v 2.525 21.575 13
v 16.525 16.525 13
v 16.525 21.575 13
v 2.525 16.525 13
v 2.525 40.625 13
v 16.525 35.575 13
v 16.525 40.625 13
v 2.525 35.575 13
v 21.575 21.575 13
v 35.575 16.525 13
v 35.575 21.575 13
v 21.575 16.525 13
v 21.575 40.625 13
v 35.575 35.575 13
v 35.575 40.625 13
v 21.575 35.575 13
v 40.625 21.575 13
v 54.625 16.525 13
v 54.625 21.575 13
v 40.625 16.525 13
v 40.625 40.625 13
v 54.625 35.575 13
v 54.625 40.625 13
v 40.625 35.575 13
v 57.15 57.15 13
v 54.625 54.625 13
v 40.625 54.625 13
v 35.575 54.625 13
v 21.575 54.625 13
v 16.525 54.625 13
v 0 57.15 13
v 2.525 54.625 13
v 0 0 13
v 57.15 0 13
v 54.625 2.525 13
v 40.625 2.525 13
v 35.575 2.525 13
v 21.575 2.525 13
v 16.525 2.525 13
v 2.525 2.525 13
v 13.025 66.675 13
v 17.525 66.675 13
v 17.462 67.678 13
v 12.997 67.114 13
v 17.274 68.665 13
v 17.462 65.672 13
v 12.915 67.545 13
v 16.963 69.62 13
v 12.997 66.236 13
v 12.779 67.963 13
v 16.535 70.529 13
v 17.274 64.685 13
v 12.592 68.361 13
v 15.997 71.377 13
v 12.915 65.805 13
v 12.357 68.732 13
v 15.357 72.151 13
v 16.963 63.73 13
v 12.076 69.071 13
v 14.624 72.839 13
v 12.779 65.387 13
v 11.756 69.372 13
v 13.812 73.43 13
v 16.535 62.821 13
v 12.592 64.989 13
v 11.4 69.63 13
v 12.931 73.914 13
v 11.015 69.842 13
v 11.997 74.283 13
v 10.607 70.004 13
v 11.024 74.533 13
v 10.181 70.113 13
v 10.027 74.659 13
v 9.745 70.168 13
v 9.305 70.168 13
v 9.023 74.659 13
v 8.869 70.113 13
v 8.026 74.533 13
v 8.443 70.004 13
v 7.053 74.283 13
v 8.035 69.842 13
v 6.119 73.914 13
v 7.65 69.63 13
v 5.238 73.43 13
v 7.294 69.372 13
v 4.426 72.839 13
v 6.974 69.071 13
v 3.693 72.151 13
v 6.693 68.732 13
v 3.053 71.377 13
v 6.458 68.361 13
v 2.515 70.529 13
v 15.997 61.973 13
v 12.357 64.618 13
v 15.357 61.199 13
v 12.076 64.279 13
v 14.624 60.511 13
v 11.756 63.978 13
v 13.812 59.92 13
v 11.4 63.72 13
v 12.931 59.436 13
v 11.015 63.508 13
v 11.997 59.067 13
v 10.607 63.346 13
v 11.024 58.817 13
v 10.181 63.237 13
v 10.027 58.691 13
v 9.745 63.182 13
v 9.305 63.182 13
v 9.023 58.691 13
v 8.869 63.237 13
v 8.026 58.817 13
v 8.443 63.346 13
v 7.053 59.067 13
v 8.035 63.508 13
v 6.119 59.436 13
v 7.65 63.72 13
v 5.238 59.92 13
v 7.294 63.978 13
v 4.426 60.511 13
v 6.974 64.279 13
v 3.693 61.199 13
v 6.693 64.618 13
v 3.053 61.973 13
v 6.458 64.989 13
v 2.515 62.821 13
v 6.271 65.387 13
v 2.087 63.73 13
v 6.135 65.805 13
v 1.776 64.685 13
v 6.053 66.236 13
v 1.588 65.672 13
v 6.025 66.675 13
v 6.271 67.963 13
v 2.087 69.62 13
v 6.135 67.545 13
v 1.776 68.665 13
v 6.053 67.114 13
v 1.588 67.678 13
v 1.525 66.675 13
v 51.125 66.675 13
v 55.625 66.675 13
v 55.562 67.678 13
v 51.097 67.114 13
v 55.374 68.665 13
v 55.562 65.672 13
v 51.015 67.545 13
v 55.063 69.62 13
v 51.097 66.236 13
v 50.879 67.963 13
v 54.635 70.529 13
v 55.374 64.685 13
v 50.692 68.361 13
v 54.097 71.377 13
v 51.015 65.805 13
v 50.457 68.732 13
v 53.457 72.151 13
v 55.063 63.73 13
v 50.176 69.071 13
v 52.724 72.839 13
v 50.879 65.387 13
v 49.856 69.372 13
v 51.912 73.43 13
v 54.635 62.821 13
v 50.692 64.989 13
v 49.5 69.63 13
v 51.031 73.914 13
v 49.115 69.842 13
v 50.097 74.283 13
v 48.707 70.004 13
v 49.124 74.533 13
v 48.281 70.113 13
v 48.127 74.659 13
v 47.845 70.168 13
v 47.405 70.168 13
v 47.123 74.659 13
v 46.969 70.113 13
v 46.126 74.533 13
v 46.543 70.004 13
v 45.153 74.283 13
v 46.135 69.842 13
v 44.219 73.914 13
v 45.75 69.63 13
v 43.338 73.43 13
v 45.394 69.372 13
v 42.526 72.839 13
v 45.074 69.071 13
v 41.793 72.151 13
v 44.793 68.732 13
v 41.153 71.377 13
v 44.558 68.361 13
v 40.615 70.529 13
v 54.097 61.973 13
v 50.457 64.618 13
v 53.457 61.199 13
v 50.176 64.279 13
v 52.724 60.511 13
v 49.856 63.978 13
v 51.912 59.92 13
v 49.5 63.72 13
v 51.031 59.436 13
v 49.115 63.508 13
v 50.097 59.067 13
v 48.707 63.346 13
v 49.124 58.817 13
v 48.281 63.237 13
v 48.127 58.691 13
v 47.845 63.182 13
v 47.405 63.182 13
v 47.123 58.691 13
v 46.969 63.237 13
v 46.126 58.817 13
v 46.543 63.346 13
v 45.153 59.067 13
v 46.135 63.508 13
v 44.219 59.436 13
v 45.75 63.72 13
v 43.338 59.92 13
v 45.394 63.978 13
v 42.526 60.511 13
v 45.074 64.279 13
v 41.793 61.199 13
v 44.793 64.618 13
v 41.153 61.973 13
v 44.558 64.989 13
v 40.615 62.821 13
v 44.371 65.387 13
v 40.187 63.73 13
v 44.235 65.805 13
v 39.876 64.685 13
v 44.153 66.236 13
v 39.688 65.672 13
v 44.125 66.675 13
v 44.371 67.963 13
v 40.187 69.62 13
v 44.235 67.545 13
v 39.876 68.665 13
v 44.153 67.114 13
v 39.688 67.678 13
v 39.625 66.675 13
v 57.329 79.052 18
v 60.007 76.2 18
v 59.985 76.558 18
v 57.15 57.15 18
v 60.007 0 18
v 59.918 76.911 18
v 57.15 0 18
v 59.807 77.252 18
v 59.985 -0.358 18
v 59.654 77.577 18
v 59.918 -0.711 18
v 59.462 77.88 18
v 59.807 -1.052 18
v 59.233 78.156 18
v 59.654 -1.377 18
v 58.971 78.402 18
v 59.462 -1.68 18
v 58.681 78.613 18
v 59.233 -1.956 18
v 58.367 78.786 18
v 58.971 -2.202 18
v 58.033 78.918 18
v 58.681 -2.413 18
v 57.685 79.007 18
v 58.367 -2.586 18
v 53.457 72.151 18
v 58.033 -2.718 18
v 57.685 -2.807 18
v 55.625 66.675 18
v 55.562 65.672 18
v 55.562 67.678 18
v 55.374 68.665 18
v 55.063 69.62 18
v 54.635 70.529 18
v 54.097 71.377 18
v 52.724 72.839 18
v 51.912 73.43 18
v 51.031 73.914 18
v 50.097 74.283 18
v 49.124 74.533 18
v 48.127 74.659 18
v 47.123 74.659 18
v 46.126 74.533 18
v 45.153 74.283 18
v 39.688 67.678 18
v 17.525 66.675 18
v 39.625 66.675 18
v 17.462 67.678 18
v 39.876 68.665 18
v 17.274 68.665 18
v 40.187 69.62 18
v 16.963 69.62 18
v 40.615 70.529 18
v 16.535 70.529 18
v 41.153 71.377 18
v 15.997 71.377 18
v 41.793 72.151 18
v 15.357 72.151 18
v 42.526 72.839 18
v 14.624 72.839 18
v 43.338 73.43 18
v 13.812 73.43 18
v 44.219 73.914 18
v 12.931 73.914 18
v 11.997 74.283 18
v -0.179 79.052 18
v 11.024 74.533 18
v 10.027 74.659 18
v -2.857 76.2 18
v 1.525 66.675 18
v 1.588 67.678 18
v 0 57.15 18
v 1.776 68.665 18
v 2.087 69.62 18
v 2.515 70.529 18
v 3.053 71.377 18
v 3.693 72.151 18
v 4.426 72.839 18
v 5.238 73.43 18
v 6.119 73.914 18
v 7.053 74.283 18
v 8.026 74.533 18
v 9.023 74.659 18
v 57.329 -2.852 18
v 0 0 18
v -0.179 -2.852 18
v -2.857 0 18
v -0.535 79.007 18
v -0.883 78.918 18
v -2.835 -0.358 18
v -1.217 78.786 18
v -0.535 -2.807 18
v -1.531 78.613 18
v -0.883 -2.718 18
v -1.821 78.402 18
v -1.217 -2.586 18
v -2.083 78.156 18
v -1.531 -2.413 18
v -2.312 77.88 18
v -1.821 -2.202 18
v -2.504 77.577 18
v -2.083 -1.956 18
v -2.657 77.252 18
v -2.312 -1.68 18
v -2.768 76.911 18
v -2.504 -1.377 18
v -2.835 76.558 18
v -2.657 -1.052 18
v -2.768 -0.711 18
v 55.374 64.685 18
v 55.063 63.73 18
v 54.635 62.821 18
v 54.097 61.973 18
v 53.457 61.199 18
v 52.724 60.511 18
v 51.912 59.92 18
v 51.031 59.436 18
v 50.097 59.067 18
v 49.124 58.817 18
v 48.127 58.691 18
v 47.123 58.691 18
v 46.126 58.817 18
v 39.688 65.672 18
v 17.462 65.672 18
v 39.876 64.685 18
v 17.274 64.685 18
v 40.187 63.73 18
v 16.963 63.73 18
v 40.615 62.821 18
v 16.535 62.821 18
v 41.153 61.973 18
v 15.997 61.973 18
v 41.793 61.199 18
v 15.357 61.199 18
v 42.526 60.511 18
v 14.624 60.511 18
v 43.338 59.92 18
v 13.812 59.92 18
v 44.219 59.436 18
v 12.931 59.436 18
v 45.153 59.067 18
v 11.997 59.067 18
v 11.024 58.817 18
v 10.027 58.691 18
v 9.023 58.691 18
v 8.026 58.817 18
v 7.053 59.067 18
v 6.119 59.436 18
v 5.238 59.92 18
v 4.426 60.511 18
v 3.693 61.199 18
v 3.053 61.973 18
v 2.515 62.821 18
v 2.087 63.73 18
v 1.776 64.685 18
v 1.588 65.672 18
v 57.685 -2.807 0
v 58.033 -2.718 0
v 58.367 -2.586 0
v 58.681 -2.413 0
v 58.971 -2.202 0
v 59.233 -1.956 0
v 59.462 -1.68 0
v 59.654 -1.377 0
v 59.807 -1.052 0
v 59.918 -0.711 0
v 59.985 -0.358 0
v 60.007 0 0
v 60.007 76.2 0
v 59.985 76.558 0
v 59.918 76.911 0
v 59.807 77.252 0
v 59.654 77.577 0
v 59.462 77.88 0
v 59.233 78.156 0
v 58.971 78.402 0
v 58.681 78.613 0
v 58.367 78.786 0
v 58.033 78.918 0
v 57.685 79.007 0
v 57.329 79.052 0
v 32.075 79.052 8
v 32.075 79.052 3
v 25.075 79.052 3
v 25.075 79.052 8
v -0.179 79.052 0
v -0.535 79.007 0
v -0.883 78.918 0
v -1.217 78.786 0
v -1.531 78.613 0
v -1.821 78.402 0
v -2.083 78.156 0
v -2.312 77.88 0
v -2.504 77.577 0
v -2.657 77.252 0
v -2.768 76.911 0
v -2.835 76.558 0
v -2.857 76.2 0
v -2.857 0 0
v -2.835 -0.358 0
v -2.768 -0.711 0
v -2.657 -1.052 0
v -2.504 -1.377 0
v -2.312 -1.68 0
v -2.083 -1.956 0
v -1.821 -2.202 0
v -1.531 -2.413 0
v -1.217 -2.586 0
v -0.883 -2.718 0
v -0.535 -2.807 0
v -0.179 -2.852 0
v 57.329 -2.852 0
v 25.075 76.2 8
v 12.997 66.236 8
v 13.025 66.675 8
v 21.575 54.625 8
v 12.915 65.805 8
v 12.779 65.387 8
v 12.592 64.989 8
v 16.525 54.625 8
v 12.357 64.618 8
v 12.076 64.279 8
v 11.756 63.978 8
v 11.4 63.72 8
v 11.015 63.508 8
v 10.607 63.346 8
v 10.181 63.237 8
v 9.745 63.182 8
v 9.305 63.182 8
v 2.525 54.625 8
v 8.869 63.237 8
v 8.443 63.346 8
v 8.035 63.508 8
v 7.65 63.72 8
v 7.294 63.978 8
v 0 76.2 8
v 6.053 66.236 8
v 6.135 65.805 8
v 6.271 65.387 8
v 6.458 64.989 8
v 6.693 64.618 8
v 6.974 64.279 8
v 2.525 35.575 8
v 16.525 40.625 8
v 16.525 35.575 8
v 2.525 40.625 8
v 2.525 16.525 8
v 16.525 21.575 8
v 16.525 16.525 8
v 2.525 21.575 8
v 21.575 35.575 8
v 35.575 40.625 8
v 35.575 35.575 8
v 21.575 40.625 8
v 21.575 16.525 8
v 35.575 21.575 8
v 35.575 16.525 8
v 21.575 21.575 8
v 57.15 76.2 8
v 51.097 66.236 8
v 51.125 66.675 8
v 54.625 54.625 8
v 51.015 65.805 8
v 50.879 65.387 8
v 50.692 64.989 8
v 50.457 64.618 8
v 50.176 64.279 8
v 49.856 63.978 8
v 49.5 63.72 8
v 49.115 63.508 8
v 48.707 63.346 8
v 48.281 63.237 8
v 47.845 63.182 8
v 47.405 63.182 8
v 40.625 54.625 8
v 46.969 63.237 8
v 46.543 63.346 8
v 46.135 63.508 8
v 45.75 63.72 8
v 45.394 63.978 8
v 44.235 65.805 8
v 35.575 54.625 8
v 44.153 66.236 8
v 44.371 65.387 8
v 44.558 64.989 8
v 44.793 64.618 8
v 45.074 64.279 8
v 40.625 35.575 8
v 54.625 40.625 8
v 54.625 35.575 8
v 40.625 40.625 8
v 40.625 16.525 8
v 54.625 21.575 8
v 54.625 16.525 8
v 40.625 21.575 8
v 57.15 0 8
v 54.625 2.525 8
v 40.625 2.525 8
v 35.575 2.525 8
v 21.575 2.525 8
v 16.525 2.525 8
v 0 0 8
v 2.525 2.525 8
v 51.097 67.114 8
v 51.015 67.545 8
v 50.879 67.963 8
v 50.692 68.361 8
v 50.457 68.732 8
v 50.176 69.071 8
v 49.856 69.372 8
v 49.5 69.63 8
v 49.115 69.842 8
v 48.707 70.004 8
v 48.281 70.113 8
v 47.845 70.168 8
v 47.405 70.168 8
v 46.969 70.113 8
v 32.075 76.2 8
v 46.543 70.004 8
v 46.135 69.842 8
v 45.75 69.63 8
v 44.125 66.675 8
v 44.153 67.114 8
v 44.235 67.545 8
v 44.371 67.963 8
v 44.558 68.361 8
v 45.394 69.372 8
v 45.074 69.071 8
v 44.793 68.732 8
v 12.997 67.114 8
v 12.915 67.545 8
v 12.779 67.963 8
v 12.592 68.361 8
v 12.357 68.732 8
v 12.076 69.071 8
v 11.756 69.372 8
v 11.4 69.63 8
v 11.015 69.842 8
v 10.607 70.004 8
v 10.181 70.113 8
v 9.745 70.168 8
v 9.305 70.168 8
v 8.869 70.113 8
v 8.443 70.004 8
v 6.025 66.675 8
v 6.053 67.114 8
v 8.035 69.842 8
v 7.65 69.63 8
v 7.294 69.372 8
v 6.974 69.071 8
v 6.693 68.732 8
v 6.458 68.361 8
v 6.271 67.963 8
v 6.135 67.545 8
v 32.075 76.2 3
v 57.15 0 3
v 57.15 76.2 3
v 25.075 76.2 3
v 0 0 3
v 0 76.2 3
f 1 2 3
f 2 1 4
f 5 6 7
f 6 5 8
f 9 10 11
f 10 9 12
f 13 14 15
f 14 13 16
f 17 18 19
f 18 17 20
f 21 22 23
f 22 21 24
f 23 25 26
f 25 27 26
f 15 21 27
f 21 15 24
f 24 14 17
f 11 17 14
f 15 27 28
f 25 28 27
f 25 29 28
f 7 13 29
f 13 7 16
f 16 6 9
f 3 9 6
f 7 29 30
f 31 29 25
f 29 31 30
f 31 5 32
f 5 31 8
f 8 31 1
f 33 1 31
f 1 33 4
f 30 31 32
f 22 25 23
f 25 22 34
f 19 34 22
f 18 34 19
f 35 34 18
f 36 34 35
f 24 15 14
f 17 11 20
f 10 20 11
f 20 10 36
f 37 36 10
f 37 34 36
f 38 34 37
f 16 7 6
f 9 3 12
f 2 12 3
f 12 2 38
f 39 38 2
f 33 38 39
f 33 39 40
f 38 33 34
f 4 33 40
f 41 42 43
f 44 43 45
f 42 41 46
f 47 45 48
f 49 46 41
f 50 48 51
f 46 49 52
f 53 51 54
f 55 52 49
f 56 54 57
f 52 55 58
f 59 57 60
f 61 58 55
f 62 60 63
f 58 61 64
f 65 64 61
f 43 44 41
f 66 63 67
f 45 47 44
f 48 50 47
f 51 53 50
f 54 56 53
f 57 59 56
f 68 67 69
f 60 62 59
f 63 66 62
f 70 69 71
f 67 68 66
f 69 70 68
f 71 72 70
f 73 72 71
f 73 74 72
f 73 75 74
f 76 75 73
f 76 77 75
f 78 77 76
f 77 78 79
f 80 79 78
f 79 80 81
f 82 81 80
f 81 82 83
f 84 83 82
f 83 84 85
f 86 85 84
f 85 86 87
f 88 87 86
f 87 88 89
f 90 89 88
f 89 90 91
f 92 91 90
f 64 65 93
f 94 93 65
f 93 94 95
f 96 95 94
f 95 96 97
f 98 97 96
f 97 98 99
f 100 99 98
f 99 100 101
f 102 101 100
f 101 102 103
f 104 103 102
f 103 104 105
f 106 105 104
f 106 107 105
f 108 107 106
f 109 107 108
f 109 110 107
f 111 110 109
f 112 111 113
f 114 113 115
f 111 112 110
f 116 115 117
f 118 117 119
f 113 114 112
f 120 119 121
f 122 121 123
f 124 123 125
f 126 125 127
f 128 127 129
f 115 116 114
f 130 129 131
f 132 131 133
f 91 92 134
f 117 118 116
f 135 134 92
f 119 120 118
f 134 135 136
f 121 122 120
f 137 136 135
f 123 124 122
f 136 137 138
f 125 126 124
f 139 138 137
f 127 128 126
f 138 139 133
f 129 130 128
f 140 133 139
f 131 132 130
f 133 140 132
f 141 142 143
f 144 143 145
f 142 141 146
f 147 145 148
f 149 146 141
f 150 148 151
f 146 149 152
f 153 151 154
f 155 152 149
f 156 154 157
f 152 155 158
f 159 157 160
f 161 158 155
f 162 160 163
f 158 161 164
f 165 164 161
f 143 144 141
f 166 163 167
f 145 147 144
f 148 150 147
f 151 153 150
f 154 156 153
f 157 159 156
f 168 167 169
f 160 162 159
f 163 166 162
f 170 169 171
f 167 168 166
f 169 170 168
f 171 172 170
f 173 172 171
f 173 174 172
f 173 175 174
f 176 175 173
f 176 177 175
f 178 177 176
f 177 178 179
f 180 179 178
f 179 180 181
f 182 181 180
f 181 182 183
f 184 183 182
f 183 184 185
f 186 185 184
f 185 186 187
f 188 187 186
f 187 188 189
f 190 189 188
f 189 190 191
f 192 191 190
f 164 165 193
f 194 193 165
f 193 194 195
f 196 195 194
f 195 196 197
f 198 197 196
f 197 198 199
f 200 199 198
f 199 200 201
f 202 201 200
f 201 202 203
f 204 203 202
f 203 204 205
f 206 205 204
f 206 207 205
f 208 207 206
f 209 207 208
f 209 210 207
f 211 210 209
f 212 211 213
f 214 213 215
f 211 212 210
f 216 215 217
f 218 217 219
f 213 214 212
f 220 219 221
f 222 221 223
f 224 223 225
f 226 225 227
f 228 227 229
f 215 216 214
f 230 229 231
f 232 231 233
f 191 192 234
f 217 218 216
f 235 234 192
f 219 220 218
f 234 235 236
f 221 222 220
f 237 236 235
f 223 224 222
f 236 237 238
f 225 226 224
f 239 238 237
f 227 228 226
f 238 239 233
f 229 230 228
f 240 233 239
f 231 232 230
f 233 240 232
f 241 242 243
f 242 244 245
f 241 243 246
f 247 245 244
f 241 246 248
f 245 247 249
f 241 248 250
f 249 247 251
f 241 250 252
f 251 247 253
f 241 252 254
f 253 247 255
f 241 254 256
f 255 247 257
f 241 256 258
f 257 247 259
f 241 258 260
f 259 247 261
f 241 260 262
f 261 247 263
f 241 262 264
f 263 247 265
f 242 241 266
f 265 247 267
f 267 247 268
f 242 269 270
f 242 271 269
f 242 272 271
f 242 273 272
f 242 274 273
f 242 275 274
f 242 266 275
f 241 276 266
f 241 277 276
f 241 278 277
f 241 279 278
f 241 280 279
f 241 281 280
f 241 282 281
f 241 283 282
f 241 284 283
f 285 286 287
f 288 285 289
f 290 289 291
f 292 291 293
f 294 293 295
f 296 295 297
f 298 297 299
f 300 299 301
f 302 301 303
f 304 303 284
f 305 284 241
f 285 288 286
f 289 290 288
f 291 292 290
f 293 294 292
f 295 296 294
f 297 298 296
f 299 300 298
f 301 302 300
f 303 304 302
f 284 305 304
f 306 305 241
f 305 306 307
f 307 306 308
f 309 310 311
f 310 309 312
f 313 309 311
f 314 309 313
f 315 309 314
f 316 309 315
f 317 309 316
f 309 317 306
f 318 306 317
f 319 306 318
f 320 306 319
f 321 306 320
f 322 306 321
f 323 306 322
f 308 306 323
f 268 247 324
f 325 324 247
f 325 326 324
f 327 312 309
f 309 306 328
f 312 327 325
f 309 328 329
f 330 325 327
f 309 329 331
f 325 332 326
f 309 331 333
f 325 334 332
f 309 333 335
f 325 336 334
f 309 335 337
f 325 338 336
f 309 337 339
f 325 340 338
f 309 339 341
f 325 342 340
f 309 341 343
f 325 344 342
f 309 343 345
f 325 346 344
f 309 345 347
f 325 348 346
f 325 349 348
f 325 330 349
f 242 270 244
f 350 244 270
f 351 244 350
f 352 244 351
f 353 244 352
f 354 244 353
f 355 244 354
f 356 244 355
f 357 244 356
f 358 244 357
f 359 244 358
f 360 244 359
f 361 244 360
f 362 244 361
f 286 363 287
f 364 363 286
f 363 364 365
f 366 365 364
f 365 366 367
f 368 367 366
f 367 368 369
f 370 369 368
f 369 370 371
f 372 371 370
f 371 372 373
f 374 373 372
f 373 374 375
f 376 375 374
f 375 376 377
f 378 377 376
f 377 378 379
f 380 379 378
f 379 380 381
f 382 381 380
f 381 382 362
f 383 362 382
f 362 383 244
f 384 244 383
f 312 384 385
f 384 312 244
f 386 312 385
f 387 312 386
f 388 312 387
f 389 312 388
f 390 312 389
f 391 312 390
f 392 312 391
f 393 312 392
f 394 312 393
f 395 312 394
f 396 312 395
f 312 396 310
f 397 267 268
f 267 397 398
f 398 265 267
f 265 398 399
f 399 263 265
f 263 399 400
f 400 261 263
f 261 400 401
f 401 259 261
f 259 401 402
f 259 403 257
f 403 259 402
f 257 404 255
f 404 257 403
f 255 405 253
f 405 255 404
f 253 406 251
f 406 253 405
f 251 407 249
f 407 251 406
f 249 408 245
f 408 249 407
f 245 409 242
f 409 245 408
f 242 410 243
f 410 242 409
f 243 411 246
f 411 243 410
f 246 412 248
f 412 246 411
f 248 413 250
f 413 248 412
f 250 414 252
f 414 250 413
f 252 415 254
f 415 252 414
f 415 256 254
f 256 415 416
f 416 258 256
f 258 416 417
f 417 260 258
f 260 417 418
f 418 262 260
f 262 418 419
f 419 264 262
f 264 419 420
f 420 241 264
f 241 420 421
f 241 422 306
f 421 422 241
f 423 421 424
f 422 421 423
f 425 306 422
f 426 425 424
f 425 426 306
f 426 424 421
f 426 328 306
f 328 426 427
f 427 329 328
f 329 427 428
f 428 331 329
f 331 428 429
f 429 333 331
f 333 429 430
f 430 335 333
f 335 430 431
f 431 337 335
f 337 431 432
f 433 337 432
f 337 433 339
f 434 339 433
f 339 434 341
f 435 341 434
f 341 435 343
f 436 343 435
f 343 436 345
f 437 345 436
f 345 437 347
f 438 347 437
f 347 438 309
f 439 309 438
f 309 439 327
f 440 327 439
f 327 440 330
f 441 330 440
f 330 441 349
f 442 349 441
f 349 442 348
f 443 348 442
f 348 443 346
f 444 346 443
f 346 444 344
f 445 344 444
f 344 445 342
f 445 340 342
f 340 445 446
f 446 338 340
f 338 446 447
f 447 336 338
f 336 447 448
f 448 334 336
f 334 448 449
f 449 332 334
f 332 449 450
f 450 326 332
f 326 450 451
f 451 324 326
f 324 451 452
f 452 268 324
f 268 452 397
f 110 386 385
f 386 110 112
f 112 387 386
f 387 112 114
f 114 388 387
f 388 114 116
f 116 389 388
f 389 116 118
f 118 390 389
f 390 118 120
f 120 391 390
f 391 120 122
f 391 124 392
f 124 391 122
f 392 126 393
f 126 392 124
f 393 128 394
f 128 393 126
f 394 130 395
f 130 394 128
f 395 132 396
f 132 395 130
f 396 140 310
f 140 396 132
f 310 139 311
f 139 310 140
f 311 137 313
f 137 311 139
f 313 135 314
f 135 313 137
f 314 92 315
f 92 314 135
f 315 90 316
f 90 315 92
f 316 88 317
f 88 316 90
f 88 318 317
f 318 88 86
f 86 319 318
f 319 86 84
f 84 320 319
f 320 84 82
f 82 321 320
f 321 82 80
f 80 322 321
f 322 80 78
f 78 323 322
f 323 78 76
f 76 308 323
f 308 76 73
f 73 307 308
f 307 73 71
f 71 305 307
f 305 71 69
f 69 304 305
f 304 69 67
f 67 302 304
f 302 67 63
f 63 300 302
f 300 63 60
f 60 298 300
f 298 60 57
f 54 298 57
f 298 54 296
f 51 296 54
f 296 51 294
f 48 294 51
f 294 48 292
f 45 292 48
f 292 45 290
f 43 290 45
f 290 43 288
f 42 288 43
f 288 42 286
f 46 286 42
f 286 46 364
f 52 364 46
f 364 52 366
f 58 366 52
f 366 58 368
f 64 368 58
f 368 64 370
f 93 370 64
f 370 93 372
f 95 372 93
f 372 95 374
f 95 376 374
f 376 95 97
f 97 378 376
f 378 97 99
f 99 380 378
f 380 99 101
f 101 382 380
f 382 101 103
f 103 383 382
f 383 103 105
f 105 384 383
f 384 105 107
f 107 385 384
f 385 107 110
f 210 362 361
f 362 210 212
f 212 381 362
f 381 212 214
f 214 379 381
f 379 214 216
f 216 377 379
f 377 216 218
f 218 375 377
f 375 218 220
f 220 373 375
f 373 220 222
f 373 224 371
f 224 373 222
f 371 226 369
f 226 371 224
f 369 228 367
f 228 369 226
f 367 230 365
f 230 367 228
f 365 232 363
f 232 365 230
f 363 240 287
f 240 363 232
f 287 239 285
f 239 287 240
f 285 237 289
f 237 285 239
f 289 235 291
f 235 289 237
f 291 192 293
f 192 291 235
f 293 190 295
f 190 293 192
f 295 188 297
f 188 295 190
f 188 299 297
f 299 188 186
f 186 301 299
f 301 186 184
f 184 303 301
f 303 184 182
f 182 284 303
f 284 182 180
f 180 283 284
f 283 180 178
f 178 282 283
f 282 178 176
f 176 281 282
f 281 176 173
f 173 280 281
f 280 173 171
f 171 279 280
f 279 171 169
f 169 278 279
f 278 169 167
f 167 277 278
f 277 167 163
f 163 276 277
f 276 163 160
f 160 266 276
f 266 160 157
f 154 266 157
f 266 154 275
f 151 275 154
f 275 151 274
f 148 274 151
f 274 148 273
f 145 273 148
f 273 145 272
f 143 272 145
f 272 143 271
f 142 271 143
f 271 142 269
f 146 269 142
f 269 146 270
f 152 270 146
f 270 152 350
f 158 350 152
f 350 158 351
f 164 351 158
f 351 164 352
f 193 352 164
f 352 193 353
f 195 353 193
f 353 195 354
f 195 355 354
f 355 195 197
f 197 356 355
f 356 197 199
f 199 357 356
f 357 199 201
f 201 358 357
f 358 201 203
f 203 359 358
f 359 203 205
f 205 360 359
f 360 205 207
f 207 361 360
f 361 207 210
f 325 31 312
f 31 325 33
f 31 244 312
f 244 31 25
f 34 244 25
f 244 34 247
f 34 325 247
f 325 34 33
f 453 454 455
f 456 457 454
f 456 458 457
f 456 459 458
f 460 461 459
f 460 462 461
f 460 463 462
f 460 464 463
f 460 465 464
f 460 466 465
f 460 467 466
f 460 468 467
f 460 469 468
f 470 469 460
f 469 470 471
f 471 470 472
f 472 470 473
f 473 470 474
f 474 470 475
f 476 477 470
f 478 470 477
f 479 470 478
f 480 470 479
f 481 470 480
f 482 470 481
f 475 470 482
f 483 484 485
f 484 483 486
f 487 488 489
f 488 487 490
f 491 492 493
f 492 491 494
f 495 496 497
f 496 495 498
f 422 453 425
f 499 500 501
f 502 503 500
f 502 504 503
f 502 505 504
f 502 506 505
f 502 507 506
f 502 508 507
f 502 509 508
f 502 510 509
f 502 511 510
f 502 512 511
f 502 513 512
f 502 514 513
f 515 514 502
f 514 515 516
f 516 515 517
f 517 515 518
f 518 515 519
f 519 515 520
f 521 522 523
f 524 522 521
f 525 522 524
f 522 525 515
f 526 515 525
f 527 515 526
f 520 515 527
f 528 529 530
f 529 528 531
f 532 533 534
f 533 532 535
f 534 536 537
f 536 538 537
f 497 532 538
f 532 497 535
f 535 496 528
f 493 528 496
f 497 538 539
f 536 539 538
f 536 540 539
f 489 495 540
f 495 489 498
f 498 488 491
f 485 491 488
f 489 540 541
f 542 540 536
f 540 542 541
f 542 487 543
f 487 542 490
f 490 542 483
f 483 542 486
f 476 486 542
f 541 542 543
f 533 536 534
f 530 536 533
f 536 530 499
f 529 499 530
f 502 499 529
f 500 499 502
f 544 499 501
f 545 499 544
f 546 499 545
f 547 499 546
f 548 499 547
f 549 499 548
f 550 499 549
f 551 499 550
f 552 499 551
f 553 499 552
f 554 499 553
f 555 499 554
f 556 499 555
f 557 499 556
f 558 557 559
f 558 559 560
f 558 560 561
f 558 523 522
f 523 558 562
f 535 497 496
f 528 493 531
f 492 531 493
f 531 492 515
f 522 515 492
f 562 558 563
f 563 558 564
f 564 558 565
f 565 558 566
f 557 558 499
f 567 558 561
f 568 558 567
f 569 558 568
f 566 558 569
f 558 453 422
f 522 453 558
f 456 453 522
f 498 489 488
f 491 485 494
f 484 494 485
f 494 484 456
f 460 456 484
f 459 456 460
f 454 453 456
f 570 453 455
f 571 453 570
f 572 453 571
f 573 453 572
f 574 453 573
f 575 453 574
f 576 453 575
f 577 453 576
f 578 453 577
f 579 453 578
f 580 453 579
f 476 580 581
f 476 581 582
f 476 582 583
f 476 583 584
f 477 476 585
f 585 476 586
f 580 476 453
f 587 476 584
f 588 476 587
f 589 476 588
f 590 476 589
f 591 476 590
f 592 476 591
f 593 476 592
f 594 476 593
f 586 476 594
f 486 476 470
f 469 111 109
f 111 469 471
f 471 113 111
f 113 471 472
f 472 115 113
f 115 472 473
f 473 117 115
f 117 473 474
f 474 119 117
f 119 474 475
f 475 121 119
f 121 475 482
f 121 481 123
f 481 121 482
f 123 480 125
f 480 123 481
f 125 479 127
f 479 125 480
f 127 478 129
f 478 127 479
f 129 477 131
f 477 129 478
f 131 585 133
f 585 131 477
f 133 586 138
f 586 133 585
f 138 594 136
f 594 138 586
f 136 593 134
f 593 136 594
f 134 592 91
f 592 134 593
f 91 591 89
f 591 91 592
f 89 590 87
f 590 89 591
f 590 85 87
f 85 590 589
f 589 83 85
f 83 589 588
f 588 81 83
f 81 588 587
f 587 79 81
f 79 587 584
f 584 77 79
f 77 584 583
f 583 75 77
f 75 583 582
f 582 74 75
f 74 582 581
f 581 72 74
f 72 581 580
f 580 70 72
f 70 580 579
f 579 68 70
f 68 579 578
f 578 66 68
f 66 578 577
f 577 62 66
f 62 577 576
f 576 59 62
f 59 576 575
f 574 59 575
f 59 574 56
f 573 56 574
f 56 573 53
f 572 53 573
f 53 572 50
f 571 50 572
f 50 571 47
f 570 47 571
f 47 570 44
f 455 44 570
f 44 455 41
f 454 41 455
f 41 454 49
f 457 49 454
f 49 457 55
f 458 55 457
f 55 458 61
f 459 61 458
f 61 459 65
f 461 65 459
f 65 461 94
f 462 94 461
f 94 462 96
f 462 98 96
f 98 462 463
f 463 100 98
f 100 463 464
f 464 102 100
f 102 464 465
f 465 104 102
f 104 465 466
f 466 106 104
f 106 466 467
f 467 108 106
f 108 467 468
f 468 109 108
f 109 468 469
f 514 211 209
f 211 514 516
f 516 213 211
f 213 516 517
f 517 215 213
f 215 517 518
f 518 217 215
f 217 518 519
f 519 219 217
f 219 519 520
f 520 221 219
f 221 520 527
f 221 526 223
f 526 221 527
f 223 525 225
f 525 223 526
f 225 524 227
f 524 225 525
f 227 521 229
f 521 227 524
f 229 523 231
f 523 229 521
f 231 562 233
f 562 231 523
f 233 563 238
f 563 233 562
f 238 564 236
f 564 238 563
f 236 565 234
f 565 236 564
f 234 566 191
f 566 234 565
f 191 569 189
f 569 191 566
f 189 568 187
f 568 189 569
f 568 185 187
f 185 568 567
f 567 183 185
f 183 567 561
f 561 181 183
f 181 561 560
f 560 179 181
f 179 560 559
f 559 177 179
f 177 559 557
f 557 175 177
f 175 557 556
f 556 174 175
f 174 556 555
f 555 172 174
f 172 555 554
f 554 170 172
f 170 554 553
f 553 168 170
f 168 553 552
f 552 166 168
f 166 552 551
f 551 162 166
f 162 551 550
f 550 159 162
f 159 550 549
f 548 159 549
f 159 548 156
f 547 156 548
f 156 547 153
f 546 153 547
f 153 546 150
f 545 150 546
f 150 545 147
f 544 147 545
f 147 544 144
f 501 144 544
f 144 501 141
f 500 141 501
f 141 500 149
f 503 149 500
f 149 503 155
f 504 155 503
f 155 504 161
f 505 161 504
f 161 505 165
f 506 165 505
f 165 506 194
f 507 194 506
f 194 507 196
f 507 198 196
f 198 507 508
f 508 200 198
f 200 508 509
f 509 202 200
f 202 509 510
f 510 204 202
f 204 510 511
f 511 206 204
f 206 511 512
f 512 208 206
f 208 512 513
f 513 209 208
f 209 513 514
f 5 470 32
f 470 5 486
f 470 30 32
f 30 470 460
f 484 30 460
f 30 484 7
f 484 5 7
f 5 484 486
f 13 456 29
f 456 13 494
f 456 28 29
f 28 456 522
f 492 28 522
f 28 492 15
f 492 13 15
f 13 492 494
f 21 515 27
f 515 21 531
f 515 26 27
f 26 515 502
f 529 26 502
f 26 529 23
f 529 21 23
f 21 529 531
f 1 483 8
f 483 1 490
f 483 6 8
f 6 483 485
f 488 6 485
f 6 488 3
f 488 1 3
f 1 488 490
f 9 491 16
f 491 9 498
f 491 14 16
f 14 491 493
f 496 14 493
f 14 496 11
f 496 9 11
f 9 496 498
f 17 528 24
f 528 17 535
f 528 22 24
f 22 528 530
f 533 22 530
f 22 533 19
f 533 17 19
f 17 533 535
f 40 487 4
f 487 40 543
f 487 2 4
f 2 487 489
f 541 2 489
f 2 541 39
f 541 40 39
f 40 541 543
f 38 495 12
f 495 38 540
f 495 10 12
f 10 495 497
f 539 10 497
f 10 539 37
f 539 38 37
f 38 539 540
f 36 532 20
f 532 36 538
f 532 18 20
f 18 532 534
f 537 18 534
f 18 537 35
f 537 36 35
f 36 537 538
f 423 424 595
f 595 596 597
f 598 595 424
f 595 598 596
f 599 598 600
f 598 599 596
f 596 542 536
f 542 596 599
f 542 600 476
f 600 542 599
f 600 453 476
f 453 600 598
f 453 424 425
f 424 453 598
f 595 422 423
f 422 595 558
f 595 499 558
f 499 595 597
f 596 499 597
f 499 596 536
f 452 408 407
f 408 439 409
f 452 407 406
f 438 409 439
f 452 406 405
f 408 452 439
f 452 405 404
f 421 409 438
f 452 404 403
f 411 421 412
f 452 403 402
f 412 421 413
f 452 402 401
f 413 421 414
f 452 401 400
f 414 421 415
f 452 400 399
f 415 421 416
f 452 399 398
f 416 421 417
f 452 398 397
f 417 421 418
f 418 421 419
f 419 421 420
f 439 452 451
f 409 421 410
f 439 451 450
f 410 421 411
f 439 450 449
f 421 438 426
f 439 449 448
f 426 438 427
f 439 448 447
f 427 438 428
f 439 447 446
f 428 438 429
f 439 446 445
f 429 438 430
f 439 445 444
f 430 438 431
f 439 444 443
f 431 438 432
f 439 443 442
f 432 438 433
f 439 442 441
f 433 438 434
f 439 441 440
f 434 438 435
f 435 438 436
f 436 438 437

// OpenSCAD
union () {
  translate ([0, 0, 13]) {
    linear_extrude (height=5){
      difference () {
        minkowski () {
          translate ([0, 0, ]) {
            union () {
              translate ([0.0, 0.0, ]) {
                translate ([9.525, 9.525, ]) {
                  square ([19.05, 19.05], center=true);
                }
              }
              translate ([19.05, 0.0, ]) {
                translate ([9.525, 9.525, ]) {
                  square ([19.05, 19.05], center=true);
                }
              }
              translate ([38.1, 0.0, ]) {
                translate ([9.525, 9.525, ]) {
                  square ([19.05, 19.05], center=true);
                }
              }
              translate ([0.0, 19.05, ]) {
                translate ([9.525, 9.525, ]) {
                  square ([19.05, 19.05], center=true);
                }
              }
              translate ([19.05, 19.05, ]) {
                translate ([9.525, 9.525, ]) {
                  square ([19.05, 19.05], center=true);
                }
              }
              translate ([38.1, 19.05, ]) {
                translate ([9.525, 9.525, ]) {
                  square ([19.05, 19.05], center=true);
                }
              }
              translate ([0.0, 38.1, ]) {
                translate ([9.525, 9.525, ]) {
                  square ([19.05, 19.05], center=true);
                }
              }
              translate ([19.05, 38.1, ]) {
                translate ([9.525, 9.525, ]) {
                  square ([19.05, 19.05], center=true);
                }
              }
              translate ([38.1, 38.1, ]) {
                translate ([9.525, 9.525, ]) {
                  square ([19.05, 19.05], center=true);
                }
              }
              translate ([0.0, 57.150000000000006, ]) {
                translate ([9.525, 9.525, ]) {
                  square ([19.05, 19.05], center=true);
                }
              }
              translate ([19.05, 57.150000000000006, ]) {
                translate ([9.525, 9.525, ]) {
                  square ([19.05, 19.05], center=true);
                }
              }
              translate ([38.1, 57.150000000000006, ]) {
                translate ([9.525, 9.525, ]) {
                  square ([19.05, 19.05], center=true);
                }
              }
            }
          }
          circle ($fn=50, r=2.8575);
        }
        translate ([0, 0, ]) {
          union () {
            translate ([0.0, 0.0, ]) {
              translate ([9.525, 9.525, ]) {
                square ([19.05, 19.05], center=true);
              }
            }
            translate ([19.05, 0.0, ]) {
              translate ([9.525, 9.525, ]) {
                square ([19.05, 19.05], center=true);
              }
            }
            translate ([38.1, 0.0, ]) {
              translate ([9.525, 9.525, ]) {
                square ([19.05, 19.05], center=true);
              }
            }
            translate ([0.0, 19.05, ]) {
              translate ([9.525, 9.525, ]) {
                square ([19.05, 19.05], center=true);
              }
            }
            translate ([19.05, 19.05, ]) {
              translate ([9.525, 9.525, ]) {
                square ([19.05, 19.05], center=true);
              }
            }
            translate ([38.1, 19.05, ]) {
              translate ([9.525, 9.525, ]) {
                square ([19.05, 19.05], center=true);
              }
            }
            translate ([0.0, 38.1, ]) {
              translate ([9.525, 9.525, ]) {
                square ([19.05, 19.05], center=true);
              }
            }
            translate ([19.05, 38.1, ]) {
              translate ([9.525, 9.525, ]) {
                square ([19.05, 19.05], center=true);
              }
            }
            translate ([38.1, 38.1, ]) {
              translate ([9.525, 9.525, ]) {
                square ([19.05, 19.05], center=true);
              }
            }
            translate ([0.0, 57.150000000000006, ]) {
              translate ([9.525, 9.525, ]) {
                circle ($fn=50, r=8);
              }
            }
            translate ([19.05, 57.150000000000006, ]) {
            }
            translate ([38.1, 57.150000000000006, ]) {
              translate ([9.525, 9.525, ]) {
                circle ($fn=50, r=8);
              }
            }
          }
        }
        translate ([28.575000000000003, 77.62875, ]) {
        }
      }
    }
  }
  translate ([0, 0, 8]) {
    linear_extrude (height=5){
      difference () {
        minkowski () {
          translate ([0, 0, ]) {
            union () {
              translate ([0.0, 0.0, ]) {
                translate ([9.525, 9.525, ]) {
                  square ([19.05, 19.05], center=true);
                }
              }
              translate ([19.05, 0.0, ]) {
                translate ([9.525, 9.525, ]) {
                  square ([19.05, 19.05], center=true);
                }
              }
              translate ([38.1, 0.0, ]) {
                translate ([9.525, 9.525, ]) {
                  square ([19.05, 19.05], center=true);
                }
              }
              translate ([0.0, 19.05, ]) {
                translate ([9.525, 9.525, ]) {
                  square ([19.05, 19.05], center=true);
                }
              }
              translate ([19.05, 19.05, ]) {
                translate ([9.525, 9.525, ]) {
                  square ([19.05, 19.05], center=true);
                }
              }
              translate ([38.1, 19.05, ]) {
                translate ([9.525, 9.525, ]) {
                  square ([19.05, 19.05], center=true);
                }
              }
              translate ([0.0, 38.1, ]) {
                translate ([9.525, 9.525, ]) {
                  square ([19.05, 19.05], center=true);
                }
              }
              translate ([19.05, 38.1, ]) {
                translate ([9.525, 9.525, ]) {
                  square ([19.05, 19.05], center=true);
                }
              }
              translate ([38.1, 38.1, ]) {
                translate ([9.525, 9.525, ]) {
                  square ([19.05, 19.05], center=true);
                }
              }
              translate ([0.0, 57.150000000000006, ]) {
                translate ([9.525, 9.525, ]) {
                  square ([19.05, 19.05], center=true);
                }
              }
              translate ([19.05, 57.150000000000006, ]) {
                translate ([9.525, 9.525, ]) {
                  square ([19.05, 19.05], center=true);
                }
              }
              translate ([38.1, 57.150000000000006, ]) {
                translate ([9.525, 9.525, ]) {
                  square ([19.05, 19.05], center=true);
                }
              }
            }
          }
          circle ($fn=50, r=2.8575);
        }
        translate ([0, 0, ]) {
          union () {
            translate ([0.0, 0.0, ]) {
              translate ([9.525, 9.525, ]) {
                square ([14, 14], center=true);
              }
            }
            translate ([19.05, 0.0, ]) {
              translate ([9.525, 9.525, ]) {
                square ([14, 14], center=true);
              }
            }
            translate ([38.1, 0.0, ]) {
              translate ([9.525, 9.525, ]) {
                square ([14, 14], center=true);
              }
            }
            translate ([0.0, 19.05, ]) {
              translate ([9.525, 9.525, ]) {
                square ([14, 14], center=true);
              }
            }
            translate ([19.05, 19.05, ]) {
              translate ([9.525, 9.525, ]) {
                square ([14, 14], center=true);
              }
            }
            translate ([38.1, 19.05, ]) {
              translate ([9.525, 9.525, ]) {
                square ([14, 14], center=true);
              }
            }
            translate ([0.0, 38.1, ]) {
              translate ([9.525, 9.525, ]) {
                square ([14, 14], center=true);
              }
            }
            translate ([19.05, 38.1, ]) {
              translate ([9.525, 9.525, ]) {
                square ([14, 14], center=true);
              }
            }
            translate ([38.1, 38.1, ]) {
              translate ([9.525, 9.525, ]) {
                square ([14, 14], center=true);
              }
            }
            translate ([0.0, 57.150000000000006, ]) {
              translate ([9.525, 9.525, ]) {
                circle ($fn=50, r=7/2);
              }
            }
            translate ([19.05, 57.150000000000006, ]) {
            }
            translate ([38.1, 57.150000000000006, ]) {
              translate ([9.525, 9.525, ]) {
                circle ($fn=50, r=7/2);
              }
            }
          }
        }
        translate ([28.575000000000003, 77.62875, ]) {
        }
      }
    }
  }
  translate ([0, 0, 3]) {
    linear_extrude (height=5){
      difference () {
        minkowski () {
          translate ([0, 0, ]) {
            union () {
              translate ([0.0, 0.0, ]) {
                translate ([9.525, 9.525, ]) {
                  square ([19.05, 19.05], center=true);
                }
              }
              translate ([19.05, 0.0, ]) {
                translate ([9.525, 9.525, ]) {
                  square ([19.05, 19.05], center=true);
                }
              }
              translate ([38.1, 0.0, ]) {
                translate ([9.525, 9.525, ]) {
                  square ([19.05, 19.05], center=true);
                }
              }
              translate ([0.0, 19.05, ]) {
                translate ([9.525, 9.525, ]) {
                  square ([19.05, 19.05], center=true);
                }
              }
              translate ([19.05, 19.05, ]) {
                translate ([9.525, 9.525, ]) {
                  square ([19.05, 19.05], center=true);
                }
              }
              translate ([38.1, 19.05, ]) {
                translate ([9.525, 9.525, ]) {
                  square ([19.05, 19.05], center=true);
                }
              }
              translate ([0.0, 38.1, ]) {
                translate ([9.525, 9.525, ]) {
                  square ([19.05, 19.05], center=true);
                }
              }
              translate ([19.05, 38.1, ]) {
                translate ([9.525, 9.525, ]) {
                  square ([19.05, 19.05], center=true);
                }
              }
              translate ([38.1, 38.1, ]) {
                translate ([9.525, 9.525, ]) {
                  square ([19.05, 19.05], center=true);
                }
              }
              translate ([0.0, 57.150000000000006, ]) {
                translate ([9.525, 9.525, ]) {
                  square ([19.05, 19.05], center=true);
                }
              }
              translate ([19.05, 57.150000000000006, ]) {
                translate ([9.525, 9.525, ]) {
                  square ([19.05, 19.05], center=true);
                }
              }
              translate ([38.1, 57.150000000000006, ]) {
                translate ([9.525, 9.525, ]) {
                  square ([19.05, 19.05], center=true);
                }
              }
            }
          }
          circle ($fn=50, r=2.8575);
        }
        translate ([0, 0, ]) {
          union () {
            translate ([0.0, 0.0, ]) {
              translate ([9.525, 9.525, ]) {
                square ([19.05, 19.05], center=true);
              }
            }
            translate ([19.05, 0.0, ]) {
              translate ([9.525, 9.525, ]) {
                square ([19.05, 19.05], center=true);
              }
            }
            translate ([38.1, 0.0, ]) {
              translate ([9.525, 9.525, ]) {
                square ([19.05, 19.05], center=true);
              }
            }
            translate ([0.0, 19.05, ]) {
              translate ([9.525, 9.525, ]) {
                square ([19.05, 19.05], center=true);
              }
            }
            translate ([19.05, 19.05, ]) {
              translate ([9.525, 9.525, ]) {
                square ([19.05, 19.05], center=true);
              }
            }
            translate ([38.1, 19.05, ]) {
              translate ([9.525, 9.525, ]) {
                square ([19.05, 19.05], center=true);
              }
            }
            translate ([0.0, 38.1, ]) {
              translate ([9.525, 9.525, ]) {
                square ([19.05, 19.05], center=true);
              }
            }
            translate ([19.05, 38.1, ]) {
              translate ([9.525, 9.525, ]) {
                square ([19.05, 19.05], center=true);
              }
            }
            translate ([38.1, 38.1, ]) {
              translate ([9.525, 9.525, ]) {
                square ([19.05, 19.05], center=true);
              }
            }
            translate ([0.0, 57.150000000000006, ]) {
              translate ([9.525, 9.525, ]) {
                square ([19.05, 19.05], center=true);
              }
            }
            translate ([19.05, 57.150000000000006, ]) {
              translate ([9.525, 9.525, ]) {
                square ([19.05, 19.05], center=true);
              }
            }
            translate ([38.1, 57.150000000000006, ]) {
              translate ([9.525, 9.525, ]) {
                square ([19.05, 19.05], center=true);
              }
            }
          }
        }
        translate ([28.575000000000003, 77.62875, ]) {
          square ([7, 2.8575], center=true);
        }
      }
    }
  }
  linear_extrude (height=3){
    minkowski () {
      translate ([0, 0, ]) {
        union () {
          translate ([0.0, 0.0, ]) {
            translate ([9.525, 9.525, ]) {
              square ([19.05, 19.05], center=true);
            }
          }
          translate ([19.05, 0.0, ]) {
            translate ([9.525, 9.525, ]) {
              square ([19.05, 19.05], center=true);
            }
          }
          translate ([38.1, 0.0, ]) {
            translate ([9.525, 9.525, ]) {
              square ([19.05, 19.05], center=true);
            }
          }
          translate ([0.0, 19.05, ]) {
            translate ([9.525, 9.525, ]) {
              square ([19.05, 19.05], center=true);
            }
          }
          translate ([19.05, 19.05, ]) {
            translate ([9.525, 9.525, ]) {
              square ([19.05, 19.05], center=true);
            }
          }
          translate ([38.1, 19.05, ]) {
            translate ([9.525, 9.525, ]) {
              square ([19.05, 19.05], center=true);
            }
          }
          translate ([0.0, 38.1, ]) {
            translate ([9.525, 9.525, ]) {
              square ([19.05, 19.05], center=true);
            }
          }
          translate ([19.05, 38.1, ]) {
            translate ([9.525, 9.525, ]) {
              square ([19.05, 19.05], center=true);
            }
          }
          translate ([38.1, 38.1, ]) {
            translate ([9.525, 9.525, ]) {
              square ([19.05, 19.05], center=true);
            }
          }
          translate ([0.0, 57.150000000000006, ]) {
            translate ([9.525, 9.525, ]) {
              square ([19.05, 19.05], center=true);
            }
          }
          translate ([19.05, 57.150000000000006, ]) {
            translate ([9.525, 9.525, ]) {
              square ([19.05, 19.05], center=true);
            }
          }
          translate ([38.1, 57.150000000000006, ]) {
            translate ([9.525, 9.525, ]) {
              square ([19.05, 19.05], center=true);
            }
          }
        }
      }
      circle ($fn=50, r=2.8575);
    }
  }
}
